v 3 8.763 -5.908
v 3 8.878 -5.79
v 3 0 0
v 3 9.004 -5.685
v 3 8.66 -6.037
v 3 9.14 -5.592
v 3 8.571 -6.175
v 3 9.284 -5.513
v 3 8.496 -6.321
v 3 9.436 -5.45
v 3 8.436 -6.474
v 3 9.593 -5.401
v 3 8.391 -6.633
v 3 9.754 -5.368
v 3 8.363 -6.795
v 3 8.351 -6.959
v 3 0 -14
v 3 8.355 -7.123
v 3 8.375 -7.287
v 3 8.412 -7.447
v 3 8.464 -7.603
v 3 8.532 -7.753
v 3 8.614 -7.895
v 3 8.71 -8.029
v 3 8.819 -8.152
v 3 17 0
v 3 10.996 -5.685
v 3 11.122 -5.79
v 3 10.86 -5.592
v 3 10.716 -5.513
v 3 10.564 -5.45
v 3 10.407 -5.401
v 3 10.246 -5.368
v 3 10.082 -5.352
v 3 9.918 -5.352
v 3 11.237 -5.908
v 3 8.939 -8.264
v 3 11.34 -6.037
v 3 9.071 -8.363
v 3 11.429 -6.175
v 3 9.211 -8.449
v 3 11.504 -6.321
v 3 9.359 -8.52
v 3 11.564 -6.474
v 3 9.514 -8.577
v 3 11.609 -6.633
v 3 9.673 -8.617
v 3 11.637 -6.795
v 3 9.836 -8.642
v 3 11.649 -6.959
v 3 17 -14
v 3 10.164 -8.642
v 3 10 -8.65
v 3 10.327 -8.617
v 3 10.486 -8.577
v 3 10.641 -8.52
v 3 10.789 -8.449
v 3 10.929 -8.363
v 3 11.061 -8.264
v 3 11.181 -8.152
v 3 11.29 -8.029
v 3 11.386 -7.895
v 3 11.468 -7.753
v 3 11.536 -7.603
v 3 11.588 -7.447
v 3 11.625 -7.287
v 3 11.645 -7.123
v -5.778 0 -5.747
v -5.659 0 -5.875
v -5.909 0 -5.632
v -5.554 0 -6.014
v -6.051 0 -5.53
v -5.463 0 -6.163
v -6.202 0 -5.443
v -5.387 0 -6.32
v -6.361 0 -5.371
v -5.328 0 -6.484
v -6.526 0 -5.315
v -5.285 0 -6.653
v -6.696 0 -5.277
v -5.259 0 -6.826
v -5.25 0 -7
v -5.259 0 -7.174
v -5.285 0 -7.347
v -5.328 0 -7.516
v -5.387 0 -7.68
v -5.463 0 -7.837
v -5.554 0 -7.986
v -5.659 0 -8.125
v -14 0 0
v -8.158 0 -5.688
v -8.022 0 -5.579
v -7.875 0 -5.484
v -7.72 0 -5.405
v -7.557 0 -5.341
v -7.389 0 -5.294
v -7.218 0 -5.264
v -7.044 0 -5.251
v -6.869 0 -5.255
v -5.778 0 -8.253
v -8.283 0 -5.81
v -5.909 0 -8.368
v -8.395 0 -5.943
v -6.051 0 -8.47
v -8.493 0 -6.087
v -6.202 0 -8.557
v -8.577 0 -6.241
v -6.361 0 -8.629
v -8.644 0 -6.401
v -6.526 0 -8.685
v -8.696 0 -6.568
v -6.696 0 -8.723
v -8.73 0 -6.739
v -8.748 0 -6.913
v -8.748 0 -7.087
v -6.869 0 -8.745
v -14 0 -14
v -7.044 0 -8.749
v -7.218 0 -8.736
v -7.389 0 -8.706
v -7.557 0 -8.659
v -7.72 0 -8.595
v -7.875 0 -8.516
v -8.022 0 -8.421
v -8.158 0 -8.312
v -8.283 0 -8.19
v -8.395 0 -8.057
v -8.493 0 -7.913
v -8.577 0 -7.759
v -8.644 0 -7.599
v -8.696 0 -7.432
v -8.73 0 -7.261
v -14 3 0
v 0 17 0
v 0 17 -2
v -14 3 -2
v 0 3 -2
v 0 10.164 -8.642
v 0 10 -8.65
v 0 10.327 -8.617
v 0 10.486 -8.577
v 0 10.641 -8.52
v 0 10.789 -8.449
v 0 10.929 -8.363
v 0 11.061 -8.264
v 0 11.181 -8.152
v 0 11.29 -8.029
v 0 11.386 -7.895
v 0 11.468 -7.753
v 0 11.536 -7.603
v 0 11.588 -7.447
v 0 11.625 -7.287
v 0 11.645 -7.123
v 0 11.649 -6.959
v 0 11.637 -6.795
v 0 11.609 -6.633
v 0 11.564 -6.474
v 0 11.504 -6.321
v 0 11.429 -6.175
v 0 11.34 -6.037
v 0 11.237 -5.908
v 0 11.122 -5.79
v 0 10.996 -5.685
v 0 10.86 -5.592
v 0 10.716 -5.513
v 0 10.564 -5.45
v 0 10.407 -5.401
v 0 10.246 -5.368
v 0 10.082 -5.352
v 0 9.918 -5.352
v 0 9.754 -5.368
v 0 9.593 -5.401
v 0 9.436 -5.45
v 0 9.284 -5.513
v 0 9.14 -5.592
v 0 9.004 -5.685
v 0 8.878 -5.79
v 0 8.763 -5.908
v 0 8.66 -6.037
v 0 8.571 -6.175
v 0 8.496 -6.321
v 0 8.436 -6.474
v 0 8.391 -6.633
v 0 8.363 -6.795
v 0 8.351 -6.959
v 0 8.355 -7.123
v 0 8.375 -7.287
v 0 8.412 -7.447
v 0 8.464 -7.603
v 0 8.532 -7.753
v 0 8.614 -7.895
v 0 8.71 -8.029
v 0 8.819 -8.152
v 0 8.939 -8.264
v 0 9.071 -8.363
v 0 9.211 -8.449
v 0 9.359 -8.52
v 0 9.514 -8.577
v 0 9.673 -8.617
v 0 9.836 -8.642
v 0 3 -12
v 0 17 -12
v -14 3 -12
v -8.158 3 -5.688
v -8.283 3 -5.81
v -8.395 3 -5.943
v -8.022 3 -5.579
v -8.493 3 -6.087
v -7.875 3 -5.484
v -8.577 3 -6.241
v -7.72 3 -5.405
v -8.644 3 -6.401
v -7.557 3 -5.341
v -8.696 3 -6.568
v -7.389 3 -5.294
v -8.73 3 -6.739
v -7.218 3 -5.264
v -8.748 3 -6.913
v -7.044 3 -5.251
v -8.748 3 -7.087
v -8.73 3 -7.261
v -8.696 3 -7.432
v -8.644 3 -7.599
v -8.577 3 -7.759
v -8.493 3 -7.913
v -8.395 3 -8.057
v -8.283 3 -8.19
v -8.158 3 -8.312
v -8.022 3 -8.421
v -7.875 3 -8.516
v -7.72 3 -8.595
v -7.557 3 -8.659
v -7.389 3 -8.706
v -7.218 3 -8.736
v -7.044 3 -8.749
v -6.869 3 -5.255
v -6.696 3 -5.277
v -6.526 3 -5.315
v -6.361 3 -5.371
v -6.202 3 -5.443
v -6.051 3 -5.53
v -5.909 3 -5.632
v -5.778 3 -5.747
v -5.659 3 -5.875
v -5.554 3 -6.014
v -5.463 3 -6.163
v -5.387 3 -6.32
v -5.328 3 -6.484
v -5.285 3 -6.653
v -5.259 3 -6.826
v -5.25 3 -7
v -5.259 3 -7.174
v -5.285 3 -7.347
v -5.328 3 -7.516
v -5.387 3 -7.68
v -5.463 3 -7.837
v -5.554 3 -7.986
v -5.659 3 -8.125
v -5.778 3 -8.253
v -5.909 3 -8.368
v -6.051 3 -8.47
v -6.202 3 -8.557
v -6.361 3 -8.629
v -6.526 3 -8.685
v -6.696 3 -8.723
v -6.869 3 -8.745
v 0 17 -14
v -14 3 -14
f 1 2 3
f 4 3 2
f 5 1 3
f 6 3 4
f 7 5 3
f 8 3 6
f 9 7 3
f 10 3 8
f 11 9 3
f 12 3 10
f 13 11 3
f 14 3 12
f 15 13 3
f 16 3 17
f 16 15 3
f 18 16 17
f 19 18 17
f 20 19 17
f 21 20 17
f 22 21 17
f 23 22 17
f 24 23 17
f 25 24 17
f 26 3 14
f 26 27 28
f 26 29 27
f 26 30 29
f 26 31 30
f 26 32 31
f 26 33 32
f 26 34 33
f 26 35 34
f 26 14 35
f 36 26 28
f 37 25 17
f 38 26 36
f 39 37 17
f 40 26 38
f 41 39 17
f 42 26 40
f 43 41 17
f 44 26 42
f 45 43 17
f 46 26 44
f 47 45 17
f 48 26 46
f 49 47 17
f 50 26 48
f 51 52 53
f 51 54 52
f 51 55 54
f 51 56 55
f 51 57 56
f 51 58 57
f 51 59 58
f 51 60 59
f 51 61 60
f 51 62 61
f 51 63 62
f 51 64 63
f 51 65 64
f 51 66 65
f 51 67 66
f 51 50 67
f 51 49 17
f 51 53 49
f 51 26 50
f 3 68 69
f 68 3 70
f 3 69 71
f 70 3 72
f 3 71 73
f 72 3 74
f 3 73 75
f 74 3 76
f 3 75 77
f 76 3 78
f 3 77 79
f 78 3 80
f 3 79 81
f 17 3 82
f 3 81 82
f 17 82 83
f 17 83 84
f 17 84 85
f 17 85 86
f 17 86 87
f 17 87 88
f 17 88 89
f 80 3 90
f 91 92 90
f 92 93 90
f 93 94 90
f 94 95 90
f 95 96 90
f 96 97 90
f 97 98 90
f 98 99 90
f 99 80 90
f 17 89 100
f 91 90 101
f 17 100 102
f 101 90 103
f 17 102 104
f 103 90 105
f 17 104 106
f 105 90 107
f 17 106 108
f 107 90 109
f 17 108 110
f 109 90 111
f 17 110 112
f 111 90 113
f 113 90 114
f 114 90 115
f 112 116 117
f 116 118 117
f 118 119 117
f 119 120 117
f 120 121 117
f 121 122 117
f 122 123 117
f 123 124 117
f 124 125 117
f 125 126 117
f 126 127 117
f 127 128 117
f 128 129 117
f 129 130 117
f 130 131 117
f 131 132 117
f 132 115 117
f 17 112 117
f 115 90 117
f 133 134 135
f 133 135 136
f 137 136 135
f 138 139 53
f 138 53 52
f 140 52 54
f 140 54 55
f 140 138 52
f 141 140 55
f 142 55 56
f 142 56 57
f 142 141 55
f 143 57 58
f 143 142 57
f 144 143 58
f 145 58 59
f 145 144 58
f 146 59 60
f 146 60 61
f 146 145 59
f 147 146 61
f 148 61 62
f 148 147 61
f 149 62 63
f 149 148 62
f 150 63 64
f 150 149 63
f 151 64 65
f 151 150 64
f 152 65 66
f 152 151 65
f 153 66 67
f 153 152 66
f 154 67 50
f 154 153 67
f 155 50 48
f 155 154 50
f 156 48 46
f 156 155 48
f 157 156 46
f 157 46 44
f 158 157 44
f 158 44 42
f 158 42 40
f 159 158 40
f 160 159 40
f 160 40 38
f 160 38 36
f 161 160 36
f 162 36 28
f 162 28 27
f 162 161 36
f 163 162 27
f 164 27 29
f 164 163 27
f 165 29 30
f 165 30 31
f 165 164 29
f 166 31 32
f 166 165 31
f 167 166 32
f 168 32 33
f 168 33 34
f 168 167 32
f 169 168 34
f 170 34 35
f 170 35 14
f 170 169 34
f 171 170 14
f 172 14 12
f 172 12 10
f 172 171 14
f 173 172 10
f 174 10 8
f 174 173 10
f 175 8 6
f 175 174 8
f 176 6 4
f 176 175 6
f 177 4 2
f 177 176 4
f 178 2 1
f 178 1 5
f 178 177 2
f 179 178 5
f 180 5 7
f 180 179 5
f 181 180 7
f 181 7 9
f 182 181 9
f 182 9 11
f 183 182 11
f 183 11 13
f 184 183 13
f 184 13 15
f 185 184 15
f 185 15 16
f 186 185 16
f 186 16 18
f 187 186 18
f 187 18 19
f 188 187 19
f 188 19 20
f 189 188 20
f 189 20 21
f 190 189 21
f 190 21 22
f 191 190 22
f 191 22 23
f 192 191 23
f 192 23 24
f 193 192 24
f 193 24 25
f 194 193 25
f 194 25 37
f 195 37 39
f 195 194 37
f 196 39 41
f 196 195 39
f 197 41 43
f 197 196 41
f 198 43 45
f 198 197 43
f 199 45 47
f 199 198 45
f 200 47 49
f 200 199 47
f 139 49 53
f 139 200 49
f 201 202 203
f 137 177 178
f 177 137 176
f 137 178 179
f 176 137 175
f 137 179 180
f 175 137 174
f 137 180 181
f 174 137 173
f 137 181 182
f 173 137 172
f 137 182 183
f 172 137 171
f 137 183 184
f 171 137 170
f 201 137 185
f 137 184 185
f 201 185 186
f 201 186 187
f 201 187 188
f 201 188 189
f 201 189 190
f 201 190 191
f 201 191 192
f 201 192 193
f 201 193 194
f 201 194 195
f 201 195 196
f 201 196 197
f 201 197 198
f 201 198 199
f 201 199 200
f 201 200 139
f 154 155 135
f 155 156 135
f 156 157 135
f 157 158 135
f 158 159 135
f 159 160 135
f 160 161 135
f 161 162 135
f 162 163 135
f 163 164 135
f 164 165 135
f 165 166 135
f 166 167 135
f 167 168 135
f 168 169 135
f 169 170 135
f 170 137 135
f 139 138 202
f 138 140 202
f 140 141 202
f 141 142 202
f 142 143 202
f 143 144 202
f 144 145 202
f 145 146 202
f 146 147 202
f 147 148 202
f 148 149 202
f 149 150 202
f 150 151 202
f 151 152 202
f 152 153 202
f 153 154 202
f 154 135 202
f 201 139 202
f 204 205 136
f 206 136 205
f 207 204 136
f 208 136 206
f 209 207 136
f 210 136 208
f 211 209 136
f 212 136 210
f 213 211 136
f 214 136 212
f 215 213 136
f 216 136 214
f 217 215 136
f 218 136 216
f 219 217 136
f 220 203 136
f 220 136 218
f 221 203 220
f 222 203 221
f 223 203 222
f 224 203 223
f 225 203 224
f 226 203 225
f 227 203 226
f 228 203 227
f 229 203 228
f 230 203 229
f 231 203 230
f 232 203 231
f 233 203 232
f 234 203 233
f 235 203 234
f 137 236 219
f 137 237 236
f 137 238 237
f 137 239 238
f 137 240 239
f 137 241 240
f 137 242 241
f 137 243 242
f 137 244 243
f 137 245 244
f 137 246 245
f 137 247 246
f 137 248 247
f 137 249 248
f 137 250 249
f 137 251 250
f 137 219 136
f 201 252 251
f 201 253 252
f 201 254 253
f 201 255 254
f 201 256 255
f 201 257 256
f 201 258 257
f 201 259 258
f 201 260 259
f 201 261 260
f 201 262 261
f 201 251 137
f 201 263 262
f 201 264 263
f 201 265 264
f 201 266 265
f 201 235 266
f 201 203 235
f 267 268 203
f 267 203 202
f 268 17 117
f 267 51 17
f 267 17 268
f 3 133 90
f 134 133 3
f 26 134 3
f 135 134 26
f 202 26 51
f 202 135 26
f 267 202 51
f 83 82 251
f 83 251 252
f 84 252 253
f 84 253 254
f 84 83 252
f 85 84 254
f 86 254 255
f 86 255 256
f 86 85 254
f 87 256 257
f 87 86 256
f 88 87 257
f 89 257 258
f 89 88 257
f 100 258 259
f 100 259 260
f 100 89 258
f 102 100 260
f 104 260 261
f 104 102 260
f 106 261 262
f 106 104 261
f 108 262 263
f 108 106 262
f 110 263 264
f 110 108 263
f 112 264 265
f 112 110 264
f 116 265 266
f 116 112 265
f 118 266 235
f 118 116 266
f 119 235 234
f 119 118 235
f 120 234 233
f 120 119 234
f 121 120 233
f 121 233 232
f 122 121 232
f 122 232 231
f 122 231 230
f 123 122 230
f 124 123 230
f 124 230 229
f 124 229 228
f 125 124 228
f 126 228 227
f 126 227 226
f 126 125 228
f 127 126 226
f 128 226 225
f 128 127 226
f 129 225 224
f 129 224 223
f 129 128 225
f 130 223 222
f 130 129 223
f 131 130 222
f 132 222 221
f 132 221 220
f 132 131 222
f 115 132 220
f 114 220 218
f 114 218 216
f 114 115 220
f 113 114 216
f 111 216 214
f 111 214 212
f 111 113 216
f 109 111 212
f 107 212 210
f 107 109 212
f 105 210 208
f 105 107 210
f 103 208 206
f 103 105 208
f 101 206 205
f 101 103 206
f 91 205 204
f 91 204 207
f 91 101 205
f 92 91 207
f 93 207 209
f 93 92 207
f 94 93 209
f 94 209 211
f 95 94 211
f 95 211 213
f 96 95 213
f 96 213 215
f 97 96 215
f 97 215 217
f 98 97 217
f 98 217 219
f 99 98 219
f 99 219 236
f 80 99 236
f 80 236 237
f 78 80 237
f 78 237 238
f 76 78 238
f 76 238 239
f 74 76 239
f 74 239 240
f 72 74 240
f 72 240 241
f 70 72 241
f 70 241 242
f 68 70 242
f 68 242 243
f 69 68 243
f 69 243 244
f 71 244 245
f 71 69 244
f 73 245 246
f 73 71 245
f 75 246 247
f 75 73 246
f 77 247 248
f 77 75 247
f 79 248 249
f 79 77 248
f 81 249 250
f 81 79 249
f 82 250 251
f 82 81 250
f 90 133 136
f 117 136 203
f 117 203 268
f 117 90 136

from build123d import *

# Parameters (mm, degrees)
SKETCH1_W           = 14
SKETCH1_H           = 14
SKETCH1_R           = 1.75
BOSS_EXTRUDE1_DEPTH = 3
SKETCH2_W           = 14
SKETCH2_H           = 17
SKETCH2_R           = 1.65
BOSS_EXTRUDE2_DEPTH = 3
BOSS_EXTRUDE3_DEPTH = 2
BOSS_EXTRUDE4_DEPTH = 2


with BuildPart() as part:
    # Sketch1 → Boss-Extrude1 (new body)
    with BuildSketch(Plane(origin=(0, 0, 0), x_dir=(1, 0, 0), z_dir=(0, 1, 0))):
        with Locations((-7, 7)):
            Rectangle(SKETCH1_W, SKETCH1_H)
        with Locations((-7, 7)):
            Circle(SKETCH1_R, mode=Mode.SUBTRACT)
    extrude(amount=BOSS_EXTRUDE1_DEPTH)

    # Sketch2 → Boss-Extrude2 (add)
    with BuildSketch(Plane(origin=(0, 0, 0), x_dir=(0, 0, -1), z_dir=(1, 0, 0))):
        with Locations((7, 8.5)):
            Rectangle(SKETCH2_W, SKETCH2_H)
        with Locations((7, 10)):
            Circle(SKETCH2_R, mode=Mode.SUBTRACT)
    extrude(amount=BOSS_EXTRUDE2_DEPTH)

    # Sketch3 → Boss-Extrude3 (add)
    with BuildSketch(Plane.XY):
        Polygon((0, 3), (0, 17), (-14, 3), align=None)
    extrude(amount=-BOSS_EXTRUDE3_DEPTH)

    # Sketch4 → Boss-Extrude4 (add)
    with BuildSketch(Plane(origin=(0, 0, -14), x_dir=(-1, 0, 0), z_dir=(0, 0, -1))):
        Polygon((0, 3), (14, 3), (0, 17), align=None)
    extrude(amount=-BOSS_EXTRUDE4_DEPTH)


solid = part.part
